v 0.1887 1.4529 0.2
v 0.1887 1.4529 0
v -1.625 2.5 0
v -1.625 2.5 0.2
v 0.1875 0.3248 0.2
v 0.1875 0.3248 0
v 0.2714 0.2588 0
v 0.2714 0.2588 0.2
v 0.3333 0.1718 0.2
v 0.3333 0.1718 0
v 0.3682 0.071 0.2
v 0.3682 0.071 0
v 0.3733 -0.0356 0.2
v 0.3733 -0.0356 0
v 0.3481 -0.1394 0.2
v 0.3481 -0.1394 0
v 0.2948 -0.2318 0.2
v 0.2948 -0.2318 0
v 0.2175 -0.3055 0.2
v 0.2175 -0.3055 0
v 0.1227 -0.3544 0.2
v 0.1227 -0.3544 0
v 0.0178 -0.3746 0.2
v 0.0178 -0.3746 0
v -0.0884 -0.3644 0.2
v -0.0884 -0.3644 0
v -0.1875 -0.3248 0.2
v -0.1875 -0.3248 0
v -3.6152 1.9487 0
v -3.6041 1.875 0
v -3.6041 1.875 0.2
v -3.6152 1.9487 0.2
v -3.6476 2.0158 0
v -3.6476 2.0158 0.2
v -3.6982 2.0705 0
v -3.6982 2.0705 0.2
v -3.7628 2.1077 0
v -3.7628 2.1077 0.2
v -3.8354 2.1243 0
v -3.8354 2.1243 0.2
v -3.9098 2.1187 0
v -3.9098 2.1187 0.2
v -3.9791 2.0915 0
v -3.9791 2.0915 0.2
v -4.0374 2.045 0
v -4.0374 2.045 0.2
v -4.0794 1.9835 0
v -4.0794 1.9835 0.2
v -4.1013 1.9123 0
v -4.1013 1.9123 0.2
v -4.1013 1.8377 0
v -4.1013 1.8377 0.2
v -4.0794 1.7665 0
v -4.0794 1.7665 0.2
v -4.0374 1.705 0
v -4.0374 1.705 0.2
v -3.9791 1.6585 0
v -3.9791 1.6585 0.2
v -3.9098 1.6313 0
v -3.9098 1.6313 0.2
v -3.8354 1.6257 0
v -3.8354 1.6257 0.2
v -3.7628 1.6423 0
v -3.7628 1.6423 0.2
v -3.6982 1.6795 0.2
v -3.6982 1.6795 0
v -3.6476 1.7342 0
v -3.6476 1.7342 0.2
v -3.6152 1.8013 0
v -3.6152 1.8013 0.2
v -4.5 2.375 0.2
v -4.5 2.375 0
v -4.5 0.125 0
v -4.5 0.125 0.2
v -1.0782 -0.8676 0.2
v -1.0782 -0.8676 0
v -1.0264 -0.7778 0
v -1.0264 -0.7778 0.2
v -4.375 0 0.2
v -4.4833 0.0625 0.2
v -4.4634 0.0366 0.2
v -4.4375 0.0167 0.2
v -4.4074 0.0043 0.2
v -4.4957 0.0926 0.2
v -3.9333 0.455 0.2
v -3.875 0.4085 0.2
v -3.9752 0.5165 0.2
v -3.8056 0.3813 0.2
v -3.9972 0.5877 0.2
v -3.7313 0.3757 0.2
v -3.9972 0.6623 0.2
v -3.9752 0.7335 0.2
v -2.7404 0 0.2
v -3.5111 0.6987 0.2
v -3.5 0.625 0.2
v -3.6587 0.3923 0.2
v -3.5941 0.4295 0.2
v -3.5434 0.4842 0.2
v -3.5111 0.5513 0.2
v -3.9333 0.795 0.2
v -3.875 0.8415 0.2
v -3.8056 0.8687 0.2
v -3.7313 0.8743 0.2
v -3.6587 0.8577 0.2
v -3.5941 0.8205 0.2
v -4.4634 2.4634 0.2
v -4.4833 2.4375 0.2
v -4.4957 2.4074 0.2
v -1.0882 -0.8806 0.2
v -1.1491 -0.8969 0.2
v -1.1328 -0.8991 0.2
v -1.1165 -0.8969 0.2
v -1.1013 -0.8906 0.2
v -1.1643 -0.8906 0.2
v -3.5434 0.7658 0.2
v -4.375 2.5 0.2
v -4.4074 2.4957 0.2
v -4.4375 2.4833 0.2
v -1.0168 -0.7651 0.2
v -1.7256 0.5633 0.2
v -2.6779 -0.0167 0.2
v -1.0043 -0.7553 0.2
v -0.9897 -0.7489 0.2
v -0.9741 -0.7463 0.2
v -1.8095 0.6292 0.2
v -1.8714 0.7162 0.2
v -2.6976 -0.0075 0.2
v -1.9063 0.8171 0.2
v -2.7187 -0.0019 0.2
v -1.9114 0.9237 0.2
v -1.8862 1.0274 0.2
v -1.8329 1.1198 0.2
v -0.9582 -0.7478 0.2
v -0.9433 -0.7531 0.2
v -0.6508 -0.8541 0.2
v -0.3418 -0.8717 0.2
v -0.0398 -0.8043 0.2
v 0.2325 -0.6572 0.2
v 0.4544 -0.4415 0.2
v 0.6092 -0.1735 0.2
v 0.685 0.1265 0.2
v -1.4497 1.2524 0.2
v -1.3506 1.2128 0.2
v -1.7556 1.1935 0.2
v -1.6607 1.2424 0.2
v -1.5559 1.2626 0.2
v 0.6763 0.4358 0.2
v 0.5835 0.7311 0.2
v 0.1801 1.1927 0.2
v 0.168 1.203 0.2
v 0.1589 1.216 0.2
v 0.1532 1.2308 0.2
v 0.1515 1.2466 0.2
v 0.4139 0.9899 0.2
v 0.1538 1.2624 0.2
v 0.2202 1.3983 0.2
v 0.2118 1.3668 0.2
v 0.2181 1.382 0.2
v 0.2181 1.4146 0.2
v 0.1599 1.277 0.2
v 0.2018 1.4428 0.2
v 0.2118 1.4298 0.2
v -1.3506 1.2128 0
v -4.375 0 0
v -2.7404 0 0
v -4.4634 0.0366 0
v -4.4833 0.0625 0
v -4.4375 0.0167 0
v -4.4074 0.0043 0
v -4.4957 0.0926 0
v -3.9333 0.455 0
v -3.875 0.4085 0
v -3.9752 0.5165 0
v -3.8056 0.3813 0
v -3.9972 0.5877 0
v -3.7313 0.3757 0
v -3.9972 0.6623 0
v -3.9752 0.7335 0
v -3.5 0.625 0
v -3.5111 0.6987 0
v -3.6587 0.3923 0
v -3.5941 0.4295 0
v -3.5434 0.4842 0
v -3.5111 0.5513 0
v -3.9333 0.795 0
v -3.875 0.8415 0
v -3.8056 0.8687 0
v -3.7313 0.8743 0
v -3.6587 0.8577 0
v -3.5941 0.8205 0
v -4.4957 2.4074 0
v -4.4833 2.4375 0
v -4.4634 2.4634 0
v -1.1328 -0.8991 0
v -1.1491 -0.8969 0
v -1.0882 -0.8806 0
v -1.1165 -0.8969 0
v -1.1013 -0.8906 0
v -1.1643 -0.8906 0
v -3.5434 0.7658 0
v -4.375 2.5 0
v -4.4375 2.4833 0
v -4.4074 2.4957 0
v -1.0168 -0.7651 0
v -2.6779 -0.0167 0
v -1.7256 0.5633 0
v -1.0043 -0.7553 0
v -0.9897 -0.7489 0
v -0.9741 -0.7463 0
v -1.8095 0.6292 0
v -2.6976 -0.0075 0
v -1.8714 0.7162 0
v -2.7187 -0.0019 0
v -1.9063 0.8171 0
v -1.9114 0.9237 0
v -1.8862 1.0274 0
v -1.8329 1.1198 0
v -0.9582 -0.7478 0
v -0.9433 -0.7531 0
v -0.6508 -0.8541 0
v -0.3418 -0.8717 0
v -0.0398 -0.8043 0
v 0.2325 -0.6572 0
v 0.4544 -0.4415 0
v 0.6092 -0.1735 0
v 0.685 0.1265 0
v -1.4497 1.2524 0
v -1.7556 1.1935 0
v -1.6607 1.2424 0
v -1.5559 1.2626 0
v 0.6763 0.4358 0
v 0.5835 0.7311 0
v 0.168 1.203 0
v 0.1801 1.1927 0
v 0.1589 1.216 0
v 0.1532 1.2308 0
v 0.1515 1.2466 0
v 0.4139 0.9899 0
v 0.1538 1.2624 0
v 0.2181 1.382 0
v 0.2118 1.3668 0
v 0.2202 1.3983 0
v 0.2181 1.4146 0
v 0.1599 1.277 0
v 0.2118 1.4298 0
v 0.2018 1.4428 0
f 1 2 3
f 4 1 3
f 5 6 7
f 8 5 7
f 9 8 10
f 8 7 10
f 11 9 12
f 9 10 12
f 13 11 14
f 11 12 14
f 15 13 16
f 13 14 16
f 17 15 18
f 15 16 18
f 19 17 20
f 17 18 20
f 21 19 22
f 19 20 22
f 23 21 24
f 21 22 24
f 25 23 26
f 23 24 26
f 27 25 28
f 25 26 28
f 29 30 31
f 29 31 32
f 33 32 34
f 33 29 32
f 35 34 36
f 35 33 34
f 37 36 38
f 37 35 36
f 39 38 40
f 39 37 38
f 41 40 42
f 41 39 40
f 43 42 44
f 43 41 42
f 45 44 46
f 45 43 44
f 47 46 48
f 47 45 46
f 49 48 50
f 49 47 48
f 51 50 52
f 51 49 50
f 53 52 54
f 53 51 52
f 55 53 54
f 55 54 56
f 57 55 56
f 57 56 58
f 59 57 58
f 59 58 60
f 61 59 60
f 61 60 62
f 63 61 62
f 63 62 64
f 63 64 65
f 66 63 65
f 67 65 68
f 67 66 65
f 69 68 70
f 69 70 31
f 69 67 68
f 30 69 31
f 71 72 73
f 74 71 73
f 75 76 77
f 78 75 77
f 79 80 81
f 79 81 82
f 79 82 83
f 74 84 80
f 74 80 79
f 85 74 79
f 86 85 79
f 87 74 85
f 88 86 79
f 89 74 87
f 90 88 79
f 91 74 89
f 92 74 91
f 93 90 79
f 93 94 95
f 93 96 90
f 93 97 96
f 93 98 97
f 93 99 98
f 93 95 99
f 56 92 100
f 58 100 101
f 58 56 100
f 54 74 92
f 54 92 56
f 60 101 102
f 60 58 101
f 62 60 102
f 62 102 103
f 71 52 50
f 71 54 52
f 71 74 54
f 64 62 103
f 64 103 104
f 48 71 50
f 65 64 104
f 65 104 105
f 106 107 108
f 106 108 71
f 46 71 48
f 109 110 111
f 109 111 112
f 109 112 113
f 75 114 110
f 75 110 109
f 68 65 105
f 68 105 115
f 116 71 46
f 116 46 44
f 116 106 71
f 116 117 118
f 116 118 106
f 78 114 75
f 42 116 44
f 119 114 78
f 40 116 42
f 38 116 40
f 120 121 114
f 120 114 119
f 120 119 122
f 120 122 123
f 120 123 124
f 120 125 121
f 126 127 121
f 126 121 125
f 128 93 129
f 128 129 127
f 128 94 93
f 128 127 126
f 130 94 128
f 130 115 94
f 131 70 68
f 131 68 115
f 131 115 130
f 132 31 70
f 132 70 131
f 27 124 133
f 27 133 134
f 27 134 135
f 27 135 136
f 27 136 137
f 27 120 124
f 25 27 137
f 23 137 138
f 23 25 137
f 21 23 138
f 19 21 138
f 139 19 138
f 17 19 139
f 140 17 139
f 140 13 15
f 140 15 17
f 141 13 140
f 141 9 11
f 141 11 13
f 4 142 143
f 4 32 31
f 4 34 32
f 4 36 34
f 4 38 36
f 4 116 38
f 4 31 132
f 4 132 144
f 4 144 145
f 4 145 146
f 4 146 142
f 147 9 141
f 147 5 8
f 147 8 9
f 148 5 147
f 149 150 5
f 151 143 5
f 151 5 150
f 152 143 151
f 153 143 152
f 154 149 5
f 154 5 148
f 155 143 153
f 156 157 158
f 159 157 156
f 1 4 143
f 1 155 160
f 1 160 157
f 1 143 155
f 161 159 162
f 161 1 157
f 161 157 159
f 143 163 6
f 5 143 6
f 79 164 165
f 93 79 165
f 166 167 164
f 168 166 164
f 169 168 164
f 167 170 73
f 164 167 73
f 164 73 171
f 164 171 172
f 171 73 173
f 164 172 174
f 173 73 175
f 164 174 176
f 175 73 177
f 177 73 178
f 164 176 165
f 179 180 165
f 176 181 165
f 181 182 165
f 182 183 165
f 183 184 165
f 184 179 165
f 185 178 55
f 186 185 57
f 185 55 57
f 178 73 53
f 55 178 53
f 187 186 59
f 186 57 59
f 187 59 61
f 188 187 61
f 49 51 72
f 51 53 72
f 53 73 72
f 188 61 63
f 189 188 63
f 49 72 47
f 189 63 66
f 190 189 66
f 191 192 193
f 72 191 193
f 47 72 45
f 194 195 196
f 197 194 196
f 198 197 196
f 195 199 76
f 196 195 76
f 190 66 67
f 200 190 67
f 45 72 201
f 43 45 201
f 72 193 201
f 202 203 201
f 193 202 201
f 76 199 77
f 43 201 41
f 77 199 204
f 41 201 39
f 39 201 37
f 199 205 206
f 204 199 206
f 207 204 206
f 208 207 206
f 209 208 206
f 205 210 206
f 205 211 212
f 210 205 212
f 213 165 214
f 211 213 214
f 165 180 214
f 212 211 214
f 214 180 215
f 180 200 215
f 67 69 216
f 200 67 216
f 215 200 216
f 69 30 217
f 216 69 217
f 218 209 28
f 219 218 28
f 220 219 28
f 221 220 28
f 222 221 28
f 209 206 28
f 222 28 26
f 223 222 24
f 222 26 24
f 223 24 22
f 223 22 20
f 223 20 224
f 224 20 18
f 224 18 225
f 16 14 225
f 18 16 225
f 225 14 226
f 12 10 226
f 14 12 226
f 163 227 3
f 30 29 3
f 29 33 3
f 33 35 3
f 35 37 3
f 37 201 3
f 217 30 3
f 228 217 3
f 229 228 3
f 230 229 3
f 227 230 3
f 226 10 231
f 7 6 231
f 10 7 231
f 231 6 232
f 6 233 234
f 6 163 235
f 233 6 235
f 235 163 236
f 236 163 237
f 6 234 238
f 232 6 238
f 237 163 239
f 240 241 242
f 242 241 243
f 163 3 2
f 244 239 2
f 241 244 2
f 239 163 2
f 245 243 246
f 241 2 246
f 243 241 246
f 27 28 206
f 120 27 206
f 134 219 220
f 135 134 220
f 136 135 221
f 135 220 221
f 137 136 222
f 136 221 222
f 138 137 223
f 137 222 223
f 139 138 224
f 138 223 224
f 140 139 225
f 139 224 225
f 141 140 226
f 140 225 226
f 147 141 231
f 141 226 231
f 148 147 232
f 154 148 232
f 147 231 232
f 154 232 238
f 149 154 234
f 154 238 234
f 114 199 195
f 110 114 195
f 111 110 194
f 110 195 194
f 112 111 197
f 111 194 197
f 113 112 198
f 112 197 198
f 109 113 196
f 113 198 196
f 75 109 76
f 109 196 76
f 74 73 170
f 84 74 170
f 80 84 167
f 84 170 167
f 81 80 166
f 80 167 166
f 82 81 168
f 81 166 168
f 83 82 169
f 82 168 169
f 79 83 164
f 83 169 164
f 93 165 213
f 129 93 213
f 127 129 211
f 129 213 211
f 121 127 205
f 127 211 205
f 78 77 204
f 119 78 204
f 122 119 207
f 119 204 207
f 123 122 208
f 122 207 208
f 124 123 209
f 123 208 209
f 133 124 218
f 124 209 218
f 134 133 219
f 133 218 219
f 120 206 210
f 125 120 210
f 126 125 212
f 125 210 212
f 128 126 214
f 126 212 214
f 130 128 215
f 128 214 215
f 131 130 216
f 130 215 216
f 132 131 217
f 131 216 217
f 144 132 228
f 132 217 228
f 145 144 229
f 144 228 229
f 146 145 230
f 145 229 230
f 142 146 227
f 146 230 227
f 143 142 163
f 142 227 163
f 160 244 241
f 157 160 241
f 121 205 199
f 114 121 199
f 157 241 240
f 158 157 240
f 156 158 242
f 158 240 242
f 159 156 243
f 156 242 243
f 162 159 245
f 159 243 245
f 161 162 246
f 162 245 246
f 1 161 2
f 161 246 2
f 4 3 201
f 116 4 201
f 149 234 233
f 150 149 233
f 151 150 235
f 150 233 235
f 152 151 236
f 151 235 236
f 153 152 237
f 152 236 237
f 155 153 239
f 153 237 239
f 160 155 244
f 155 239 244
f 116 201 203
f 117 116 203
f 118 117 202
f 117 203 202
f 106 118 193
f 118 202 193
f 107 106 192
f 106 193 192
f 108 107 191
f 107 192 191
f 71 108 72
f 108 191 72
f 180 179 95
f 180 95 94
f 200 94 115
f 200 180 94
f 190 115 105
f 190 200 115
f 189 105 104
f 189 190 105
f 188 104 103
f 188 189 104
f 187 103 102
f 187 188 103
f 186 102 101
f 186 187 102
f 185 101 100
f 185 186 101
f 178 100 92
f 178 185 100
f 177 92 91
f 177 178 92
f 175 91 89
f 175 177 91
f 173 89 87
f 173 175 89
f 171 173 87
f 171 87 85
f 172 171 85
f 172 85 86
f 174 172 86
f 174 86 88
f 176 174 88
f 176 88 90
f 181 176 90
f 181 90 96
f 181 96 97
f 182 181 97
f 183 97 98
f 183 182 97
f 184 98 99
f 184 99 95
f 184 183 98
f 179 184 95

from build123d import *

# Parameters (mm, degrees)
SKETCH1_R           = 0.25
BOSS_EXTRUDE5_DEPTH = 0.2


with BuildPart() as part:
    # Sketch1 → Boss-Extrude5 (new body)
    with BuildSketch(Plane.XY):
        with BuildLine():
            Line((-4.5, 2.375), (-4.5, 0.125))
            ThreePointArc((-4.5, 0.125), (-4.463388348, 0.036611652), (-4.375, 0))
            Line((-4.375, 0), (-2.74036663, 0))
            ThreePointArc((-2.74036663, 0), (-2.708014249, -0.004259272), (-2.67786663, -0.016746825))
            Line((-2.67786663, -0.016746825), (-1.164290548, -0.890610383))
            ThreePointArc((-1.164290548, -0.890610383), (-1.116484948, -0.89690411), (-1.078230947, -0.867550783))
            Line((-1.078230947, -0.867550783), (-1.026395132, -0.777768517))
            ThreePointArc((-1.026395132, -0.777768517), (-0.989749497, -0.748869098), (-0.943273167, -0.753115233))
            ThreePointArc((-0.943273167, -0.753115233), (0.541047632, -0.312878012), (0.180143849, 1.192700118))
            ThreePointArc((0.180143849, 1.192700118), (0.153228424, 1.230826733), (0.159933238, 1.277012493))
            Line((0.159933238, 1.277012493), (0.211769053, 1.366794759))
            ThreePointArc((0.211769053, 1.366794759), (0.218062779, 1.414600359), (0.188709452, 1.452854359))
            Line((0.188709452, 1.452854359), (-1.625, 2.5))
            Line((-1.625, 2.5), (-4.375, 2.5))
            ThreePointArc((-4.375, 2.5), (-4.463388348, 2.463388348), (-4.5, 2.375))
        make_face()
        with Locations((-3.854119775, 1.875)):
            Circle(SKETCH1_R, mode=Mode.SUBTRACT)
        with Locations((-3.75, 0.625)):
            Circle(SKETCH1_R, mode=Mode.SUBTRACT)
        with BuildLine():
            Line((-0.1875, -0.324759526), (-1.725595036, 0.563260057))
            ThreePointArc((-1.725595036, 0.563260057), (-1.862854562, 1.075519583), (-1.350595036, 1.212779109))
            Line((-1.350595036, 1.212779109), (0.1875, 0.324759526))
            ThreePointArc((0.1875, 0.324759526), (0.324759526, -0.1875), (-0.1875, -0.324759526))
        make_face(mode=Mode.SUBTRACT)
    extrude(amount=BOSS_EXTRUDE5_DEPTH)


solid = part.part
